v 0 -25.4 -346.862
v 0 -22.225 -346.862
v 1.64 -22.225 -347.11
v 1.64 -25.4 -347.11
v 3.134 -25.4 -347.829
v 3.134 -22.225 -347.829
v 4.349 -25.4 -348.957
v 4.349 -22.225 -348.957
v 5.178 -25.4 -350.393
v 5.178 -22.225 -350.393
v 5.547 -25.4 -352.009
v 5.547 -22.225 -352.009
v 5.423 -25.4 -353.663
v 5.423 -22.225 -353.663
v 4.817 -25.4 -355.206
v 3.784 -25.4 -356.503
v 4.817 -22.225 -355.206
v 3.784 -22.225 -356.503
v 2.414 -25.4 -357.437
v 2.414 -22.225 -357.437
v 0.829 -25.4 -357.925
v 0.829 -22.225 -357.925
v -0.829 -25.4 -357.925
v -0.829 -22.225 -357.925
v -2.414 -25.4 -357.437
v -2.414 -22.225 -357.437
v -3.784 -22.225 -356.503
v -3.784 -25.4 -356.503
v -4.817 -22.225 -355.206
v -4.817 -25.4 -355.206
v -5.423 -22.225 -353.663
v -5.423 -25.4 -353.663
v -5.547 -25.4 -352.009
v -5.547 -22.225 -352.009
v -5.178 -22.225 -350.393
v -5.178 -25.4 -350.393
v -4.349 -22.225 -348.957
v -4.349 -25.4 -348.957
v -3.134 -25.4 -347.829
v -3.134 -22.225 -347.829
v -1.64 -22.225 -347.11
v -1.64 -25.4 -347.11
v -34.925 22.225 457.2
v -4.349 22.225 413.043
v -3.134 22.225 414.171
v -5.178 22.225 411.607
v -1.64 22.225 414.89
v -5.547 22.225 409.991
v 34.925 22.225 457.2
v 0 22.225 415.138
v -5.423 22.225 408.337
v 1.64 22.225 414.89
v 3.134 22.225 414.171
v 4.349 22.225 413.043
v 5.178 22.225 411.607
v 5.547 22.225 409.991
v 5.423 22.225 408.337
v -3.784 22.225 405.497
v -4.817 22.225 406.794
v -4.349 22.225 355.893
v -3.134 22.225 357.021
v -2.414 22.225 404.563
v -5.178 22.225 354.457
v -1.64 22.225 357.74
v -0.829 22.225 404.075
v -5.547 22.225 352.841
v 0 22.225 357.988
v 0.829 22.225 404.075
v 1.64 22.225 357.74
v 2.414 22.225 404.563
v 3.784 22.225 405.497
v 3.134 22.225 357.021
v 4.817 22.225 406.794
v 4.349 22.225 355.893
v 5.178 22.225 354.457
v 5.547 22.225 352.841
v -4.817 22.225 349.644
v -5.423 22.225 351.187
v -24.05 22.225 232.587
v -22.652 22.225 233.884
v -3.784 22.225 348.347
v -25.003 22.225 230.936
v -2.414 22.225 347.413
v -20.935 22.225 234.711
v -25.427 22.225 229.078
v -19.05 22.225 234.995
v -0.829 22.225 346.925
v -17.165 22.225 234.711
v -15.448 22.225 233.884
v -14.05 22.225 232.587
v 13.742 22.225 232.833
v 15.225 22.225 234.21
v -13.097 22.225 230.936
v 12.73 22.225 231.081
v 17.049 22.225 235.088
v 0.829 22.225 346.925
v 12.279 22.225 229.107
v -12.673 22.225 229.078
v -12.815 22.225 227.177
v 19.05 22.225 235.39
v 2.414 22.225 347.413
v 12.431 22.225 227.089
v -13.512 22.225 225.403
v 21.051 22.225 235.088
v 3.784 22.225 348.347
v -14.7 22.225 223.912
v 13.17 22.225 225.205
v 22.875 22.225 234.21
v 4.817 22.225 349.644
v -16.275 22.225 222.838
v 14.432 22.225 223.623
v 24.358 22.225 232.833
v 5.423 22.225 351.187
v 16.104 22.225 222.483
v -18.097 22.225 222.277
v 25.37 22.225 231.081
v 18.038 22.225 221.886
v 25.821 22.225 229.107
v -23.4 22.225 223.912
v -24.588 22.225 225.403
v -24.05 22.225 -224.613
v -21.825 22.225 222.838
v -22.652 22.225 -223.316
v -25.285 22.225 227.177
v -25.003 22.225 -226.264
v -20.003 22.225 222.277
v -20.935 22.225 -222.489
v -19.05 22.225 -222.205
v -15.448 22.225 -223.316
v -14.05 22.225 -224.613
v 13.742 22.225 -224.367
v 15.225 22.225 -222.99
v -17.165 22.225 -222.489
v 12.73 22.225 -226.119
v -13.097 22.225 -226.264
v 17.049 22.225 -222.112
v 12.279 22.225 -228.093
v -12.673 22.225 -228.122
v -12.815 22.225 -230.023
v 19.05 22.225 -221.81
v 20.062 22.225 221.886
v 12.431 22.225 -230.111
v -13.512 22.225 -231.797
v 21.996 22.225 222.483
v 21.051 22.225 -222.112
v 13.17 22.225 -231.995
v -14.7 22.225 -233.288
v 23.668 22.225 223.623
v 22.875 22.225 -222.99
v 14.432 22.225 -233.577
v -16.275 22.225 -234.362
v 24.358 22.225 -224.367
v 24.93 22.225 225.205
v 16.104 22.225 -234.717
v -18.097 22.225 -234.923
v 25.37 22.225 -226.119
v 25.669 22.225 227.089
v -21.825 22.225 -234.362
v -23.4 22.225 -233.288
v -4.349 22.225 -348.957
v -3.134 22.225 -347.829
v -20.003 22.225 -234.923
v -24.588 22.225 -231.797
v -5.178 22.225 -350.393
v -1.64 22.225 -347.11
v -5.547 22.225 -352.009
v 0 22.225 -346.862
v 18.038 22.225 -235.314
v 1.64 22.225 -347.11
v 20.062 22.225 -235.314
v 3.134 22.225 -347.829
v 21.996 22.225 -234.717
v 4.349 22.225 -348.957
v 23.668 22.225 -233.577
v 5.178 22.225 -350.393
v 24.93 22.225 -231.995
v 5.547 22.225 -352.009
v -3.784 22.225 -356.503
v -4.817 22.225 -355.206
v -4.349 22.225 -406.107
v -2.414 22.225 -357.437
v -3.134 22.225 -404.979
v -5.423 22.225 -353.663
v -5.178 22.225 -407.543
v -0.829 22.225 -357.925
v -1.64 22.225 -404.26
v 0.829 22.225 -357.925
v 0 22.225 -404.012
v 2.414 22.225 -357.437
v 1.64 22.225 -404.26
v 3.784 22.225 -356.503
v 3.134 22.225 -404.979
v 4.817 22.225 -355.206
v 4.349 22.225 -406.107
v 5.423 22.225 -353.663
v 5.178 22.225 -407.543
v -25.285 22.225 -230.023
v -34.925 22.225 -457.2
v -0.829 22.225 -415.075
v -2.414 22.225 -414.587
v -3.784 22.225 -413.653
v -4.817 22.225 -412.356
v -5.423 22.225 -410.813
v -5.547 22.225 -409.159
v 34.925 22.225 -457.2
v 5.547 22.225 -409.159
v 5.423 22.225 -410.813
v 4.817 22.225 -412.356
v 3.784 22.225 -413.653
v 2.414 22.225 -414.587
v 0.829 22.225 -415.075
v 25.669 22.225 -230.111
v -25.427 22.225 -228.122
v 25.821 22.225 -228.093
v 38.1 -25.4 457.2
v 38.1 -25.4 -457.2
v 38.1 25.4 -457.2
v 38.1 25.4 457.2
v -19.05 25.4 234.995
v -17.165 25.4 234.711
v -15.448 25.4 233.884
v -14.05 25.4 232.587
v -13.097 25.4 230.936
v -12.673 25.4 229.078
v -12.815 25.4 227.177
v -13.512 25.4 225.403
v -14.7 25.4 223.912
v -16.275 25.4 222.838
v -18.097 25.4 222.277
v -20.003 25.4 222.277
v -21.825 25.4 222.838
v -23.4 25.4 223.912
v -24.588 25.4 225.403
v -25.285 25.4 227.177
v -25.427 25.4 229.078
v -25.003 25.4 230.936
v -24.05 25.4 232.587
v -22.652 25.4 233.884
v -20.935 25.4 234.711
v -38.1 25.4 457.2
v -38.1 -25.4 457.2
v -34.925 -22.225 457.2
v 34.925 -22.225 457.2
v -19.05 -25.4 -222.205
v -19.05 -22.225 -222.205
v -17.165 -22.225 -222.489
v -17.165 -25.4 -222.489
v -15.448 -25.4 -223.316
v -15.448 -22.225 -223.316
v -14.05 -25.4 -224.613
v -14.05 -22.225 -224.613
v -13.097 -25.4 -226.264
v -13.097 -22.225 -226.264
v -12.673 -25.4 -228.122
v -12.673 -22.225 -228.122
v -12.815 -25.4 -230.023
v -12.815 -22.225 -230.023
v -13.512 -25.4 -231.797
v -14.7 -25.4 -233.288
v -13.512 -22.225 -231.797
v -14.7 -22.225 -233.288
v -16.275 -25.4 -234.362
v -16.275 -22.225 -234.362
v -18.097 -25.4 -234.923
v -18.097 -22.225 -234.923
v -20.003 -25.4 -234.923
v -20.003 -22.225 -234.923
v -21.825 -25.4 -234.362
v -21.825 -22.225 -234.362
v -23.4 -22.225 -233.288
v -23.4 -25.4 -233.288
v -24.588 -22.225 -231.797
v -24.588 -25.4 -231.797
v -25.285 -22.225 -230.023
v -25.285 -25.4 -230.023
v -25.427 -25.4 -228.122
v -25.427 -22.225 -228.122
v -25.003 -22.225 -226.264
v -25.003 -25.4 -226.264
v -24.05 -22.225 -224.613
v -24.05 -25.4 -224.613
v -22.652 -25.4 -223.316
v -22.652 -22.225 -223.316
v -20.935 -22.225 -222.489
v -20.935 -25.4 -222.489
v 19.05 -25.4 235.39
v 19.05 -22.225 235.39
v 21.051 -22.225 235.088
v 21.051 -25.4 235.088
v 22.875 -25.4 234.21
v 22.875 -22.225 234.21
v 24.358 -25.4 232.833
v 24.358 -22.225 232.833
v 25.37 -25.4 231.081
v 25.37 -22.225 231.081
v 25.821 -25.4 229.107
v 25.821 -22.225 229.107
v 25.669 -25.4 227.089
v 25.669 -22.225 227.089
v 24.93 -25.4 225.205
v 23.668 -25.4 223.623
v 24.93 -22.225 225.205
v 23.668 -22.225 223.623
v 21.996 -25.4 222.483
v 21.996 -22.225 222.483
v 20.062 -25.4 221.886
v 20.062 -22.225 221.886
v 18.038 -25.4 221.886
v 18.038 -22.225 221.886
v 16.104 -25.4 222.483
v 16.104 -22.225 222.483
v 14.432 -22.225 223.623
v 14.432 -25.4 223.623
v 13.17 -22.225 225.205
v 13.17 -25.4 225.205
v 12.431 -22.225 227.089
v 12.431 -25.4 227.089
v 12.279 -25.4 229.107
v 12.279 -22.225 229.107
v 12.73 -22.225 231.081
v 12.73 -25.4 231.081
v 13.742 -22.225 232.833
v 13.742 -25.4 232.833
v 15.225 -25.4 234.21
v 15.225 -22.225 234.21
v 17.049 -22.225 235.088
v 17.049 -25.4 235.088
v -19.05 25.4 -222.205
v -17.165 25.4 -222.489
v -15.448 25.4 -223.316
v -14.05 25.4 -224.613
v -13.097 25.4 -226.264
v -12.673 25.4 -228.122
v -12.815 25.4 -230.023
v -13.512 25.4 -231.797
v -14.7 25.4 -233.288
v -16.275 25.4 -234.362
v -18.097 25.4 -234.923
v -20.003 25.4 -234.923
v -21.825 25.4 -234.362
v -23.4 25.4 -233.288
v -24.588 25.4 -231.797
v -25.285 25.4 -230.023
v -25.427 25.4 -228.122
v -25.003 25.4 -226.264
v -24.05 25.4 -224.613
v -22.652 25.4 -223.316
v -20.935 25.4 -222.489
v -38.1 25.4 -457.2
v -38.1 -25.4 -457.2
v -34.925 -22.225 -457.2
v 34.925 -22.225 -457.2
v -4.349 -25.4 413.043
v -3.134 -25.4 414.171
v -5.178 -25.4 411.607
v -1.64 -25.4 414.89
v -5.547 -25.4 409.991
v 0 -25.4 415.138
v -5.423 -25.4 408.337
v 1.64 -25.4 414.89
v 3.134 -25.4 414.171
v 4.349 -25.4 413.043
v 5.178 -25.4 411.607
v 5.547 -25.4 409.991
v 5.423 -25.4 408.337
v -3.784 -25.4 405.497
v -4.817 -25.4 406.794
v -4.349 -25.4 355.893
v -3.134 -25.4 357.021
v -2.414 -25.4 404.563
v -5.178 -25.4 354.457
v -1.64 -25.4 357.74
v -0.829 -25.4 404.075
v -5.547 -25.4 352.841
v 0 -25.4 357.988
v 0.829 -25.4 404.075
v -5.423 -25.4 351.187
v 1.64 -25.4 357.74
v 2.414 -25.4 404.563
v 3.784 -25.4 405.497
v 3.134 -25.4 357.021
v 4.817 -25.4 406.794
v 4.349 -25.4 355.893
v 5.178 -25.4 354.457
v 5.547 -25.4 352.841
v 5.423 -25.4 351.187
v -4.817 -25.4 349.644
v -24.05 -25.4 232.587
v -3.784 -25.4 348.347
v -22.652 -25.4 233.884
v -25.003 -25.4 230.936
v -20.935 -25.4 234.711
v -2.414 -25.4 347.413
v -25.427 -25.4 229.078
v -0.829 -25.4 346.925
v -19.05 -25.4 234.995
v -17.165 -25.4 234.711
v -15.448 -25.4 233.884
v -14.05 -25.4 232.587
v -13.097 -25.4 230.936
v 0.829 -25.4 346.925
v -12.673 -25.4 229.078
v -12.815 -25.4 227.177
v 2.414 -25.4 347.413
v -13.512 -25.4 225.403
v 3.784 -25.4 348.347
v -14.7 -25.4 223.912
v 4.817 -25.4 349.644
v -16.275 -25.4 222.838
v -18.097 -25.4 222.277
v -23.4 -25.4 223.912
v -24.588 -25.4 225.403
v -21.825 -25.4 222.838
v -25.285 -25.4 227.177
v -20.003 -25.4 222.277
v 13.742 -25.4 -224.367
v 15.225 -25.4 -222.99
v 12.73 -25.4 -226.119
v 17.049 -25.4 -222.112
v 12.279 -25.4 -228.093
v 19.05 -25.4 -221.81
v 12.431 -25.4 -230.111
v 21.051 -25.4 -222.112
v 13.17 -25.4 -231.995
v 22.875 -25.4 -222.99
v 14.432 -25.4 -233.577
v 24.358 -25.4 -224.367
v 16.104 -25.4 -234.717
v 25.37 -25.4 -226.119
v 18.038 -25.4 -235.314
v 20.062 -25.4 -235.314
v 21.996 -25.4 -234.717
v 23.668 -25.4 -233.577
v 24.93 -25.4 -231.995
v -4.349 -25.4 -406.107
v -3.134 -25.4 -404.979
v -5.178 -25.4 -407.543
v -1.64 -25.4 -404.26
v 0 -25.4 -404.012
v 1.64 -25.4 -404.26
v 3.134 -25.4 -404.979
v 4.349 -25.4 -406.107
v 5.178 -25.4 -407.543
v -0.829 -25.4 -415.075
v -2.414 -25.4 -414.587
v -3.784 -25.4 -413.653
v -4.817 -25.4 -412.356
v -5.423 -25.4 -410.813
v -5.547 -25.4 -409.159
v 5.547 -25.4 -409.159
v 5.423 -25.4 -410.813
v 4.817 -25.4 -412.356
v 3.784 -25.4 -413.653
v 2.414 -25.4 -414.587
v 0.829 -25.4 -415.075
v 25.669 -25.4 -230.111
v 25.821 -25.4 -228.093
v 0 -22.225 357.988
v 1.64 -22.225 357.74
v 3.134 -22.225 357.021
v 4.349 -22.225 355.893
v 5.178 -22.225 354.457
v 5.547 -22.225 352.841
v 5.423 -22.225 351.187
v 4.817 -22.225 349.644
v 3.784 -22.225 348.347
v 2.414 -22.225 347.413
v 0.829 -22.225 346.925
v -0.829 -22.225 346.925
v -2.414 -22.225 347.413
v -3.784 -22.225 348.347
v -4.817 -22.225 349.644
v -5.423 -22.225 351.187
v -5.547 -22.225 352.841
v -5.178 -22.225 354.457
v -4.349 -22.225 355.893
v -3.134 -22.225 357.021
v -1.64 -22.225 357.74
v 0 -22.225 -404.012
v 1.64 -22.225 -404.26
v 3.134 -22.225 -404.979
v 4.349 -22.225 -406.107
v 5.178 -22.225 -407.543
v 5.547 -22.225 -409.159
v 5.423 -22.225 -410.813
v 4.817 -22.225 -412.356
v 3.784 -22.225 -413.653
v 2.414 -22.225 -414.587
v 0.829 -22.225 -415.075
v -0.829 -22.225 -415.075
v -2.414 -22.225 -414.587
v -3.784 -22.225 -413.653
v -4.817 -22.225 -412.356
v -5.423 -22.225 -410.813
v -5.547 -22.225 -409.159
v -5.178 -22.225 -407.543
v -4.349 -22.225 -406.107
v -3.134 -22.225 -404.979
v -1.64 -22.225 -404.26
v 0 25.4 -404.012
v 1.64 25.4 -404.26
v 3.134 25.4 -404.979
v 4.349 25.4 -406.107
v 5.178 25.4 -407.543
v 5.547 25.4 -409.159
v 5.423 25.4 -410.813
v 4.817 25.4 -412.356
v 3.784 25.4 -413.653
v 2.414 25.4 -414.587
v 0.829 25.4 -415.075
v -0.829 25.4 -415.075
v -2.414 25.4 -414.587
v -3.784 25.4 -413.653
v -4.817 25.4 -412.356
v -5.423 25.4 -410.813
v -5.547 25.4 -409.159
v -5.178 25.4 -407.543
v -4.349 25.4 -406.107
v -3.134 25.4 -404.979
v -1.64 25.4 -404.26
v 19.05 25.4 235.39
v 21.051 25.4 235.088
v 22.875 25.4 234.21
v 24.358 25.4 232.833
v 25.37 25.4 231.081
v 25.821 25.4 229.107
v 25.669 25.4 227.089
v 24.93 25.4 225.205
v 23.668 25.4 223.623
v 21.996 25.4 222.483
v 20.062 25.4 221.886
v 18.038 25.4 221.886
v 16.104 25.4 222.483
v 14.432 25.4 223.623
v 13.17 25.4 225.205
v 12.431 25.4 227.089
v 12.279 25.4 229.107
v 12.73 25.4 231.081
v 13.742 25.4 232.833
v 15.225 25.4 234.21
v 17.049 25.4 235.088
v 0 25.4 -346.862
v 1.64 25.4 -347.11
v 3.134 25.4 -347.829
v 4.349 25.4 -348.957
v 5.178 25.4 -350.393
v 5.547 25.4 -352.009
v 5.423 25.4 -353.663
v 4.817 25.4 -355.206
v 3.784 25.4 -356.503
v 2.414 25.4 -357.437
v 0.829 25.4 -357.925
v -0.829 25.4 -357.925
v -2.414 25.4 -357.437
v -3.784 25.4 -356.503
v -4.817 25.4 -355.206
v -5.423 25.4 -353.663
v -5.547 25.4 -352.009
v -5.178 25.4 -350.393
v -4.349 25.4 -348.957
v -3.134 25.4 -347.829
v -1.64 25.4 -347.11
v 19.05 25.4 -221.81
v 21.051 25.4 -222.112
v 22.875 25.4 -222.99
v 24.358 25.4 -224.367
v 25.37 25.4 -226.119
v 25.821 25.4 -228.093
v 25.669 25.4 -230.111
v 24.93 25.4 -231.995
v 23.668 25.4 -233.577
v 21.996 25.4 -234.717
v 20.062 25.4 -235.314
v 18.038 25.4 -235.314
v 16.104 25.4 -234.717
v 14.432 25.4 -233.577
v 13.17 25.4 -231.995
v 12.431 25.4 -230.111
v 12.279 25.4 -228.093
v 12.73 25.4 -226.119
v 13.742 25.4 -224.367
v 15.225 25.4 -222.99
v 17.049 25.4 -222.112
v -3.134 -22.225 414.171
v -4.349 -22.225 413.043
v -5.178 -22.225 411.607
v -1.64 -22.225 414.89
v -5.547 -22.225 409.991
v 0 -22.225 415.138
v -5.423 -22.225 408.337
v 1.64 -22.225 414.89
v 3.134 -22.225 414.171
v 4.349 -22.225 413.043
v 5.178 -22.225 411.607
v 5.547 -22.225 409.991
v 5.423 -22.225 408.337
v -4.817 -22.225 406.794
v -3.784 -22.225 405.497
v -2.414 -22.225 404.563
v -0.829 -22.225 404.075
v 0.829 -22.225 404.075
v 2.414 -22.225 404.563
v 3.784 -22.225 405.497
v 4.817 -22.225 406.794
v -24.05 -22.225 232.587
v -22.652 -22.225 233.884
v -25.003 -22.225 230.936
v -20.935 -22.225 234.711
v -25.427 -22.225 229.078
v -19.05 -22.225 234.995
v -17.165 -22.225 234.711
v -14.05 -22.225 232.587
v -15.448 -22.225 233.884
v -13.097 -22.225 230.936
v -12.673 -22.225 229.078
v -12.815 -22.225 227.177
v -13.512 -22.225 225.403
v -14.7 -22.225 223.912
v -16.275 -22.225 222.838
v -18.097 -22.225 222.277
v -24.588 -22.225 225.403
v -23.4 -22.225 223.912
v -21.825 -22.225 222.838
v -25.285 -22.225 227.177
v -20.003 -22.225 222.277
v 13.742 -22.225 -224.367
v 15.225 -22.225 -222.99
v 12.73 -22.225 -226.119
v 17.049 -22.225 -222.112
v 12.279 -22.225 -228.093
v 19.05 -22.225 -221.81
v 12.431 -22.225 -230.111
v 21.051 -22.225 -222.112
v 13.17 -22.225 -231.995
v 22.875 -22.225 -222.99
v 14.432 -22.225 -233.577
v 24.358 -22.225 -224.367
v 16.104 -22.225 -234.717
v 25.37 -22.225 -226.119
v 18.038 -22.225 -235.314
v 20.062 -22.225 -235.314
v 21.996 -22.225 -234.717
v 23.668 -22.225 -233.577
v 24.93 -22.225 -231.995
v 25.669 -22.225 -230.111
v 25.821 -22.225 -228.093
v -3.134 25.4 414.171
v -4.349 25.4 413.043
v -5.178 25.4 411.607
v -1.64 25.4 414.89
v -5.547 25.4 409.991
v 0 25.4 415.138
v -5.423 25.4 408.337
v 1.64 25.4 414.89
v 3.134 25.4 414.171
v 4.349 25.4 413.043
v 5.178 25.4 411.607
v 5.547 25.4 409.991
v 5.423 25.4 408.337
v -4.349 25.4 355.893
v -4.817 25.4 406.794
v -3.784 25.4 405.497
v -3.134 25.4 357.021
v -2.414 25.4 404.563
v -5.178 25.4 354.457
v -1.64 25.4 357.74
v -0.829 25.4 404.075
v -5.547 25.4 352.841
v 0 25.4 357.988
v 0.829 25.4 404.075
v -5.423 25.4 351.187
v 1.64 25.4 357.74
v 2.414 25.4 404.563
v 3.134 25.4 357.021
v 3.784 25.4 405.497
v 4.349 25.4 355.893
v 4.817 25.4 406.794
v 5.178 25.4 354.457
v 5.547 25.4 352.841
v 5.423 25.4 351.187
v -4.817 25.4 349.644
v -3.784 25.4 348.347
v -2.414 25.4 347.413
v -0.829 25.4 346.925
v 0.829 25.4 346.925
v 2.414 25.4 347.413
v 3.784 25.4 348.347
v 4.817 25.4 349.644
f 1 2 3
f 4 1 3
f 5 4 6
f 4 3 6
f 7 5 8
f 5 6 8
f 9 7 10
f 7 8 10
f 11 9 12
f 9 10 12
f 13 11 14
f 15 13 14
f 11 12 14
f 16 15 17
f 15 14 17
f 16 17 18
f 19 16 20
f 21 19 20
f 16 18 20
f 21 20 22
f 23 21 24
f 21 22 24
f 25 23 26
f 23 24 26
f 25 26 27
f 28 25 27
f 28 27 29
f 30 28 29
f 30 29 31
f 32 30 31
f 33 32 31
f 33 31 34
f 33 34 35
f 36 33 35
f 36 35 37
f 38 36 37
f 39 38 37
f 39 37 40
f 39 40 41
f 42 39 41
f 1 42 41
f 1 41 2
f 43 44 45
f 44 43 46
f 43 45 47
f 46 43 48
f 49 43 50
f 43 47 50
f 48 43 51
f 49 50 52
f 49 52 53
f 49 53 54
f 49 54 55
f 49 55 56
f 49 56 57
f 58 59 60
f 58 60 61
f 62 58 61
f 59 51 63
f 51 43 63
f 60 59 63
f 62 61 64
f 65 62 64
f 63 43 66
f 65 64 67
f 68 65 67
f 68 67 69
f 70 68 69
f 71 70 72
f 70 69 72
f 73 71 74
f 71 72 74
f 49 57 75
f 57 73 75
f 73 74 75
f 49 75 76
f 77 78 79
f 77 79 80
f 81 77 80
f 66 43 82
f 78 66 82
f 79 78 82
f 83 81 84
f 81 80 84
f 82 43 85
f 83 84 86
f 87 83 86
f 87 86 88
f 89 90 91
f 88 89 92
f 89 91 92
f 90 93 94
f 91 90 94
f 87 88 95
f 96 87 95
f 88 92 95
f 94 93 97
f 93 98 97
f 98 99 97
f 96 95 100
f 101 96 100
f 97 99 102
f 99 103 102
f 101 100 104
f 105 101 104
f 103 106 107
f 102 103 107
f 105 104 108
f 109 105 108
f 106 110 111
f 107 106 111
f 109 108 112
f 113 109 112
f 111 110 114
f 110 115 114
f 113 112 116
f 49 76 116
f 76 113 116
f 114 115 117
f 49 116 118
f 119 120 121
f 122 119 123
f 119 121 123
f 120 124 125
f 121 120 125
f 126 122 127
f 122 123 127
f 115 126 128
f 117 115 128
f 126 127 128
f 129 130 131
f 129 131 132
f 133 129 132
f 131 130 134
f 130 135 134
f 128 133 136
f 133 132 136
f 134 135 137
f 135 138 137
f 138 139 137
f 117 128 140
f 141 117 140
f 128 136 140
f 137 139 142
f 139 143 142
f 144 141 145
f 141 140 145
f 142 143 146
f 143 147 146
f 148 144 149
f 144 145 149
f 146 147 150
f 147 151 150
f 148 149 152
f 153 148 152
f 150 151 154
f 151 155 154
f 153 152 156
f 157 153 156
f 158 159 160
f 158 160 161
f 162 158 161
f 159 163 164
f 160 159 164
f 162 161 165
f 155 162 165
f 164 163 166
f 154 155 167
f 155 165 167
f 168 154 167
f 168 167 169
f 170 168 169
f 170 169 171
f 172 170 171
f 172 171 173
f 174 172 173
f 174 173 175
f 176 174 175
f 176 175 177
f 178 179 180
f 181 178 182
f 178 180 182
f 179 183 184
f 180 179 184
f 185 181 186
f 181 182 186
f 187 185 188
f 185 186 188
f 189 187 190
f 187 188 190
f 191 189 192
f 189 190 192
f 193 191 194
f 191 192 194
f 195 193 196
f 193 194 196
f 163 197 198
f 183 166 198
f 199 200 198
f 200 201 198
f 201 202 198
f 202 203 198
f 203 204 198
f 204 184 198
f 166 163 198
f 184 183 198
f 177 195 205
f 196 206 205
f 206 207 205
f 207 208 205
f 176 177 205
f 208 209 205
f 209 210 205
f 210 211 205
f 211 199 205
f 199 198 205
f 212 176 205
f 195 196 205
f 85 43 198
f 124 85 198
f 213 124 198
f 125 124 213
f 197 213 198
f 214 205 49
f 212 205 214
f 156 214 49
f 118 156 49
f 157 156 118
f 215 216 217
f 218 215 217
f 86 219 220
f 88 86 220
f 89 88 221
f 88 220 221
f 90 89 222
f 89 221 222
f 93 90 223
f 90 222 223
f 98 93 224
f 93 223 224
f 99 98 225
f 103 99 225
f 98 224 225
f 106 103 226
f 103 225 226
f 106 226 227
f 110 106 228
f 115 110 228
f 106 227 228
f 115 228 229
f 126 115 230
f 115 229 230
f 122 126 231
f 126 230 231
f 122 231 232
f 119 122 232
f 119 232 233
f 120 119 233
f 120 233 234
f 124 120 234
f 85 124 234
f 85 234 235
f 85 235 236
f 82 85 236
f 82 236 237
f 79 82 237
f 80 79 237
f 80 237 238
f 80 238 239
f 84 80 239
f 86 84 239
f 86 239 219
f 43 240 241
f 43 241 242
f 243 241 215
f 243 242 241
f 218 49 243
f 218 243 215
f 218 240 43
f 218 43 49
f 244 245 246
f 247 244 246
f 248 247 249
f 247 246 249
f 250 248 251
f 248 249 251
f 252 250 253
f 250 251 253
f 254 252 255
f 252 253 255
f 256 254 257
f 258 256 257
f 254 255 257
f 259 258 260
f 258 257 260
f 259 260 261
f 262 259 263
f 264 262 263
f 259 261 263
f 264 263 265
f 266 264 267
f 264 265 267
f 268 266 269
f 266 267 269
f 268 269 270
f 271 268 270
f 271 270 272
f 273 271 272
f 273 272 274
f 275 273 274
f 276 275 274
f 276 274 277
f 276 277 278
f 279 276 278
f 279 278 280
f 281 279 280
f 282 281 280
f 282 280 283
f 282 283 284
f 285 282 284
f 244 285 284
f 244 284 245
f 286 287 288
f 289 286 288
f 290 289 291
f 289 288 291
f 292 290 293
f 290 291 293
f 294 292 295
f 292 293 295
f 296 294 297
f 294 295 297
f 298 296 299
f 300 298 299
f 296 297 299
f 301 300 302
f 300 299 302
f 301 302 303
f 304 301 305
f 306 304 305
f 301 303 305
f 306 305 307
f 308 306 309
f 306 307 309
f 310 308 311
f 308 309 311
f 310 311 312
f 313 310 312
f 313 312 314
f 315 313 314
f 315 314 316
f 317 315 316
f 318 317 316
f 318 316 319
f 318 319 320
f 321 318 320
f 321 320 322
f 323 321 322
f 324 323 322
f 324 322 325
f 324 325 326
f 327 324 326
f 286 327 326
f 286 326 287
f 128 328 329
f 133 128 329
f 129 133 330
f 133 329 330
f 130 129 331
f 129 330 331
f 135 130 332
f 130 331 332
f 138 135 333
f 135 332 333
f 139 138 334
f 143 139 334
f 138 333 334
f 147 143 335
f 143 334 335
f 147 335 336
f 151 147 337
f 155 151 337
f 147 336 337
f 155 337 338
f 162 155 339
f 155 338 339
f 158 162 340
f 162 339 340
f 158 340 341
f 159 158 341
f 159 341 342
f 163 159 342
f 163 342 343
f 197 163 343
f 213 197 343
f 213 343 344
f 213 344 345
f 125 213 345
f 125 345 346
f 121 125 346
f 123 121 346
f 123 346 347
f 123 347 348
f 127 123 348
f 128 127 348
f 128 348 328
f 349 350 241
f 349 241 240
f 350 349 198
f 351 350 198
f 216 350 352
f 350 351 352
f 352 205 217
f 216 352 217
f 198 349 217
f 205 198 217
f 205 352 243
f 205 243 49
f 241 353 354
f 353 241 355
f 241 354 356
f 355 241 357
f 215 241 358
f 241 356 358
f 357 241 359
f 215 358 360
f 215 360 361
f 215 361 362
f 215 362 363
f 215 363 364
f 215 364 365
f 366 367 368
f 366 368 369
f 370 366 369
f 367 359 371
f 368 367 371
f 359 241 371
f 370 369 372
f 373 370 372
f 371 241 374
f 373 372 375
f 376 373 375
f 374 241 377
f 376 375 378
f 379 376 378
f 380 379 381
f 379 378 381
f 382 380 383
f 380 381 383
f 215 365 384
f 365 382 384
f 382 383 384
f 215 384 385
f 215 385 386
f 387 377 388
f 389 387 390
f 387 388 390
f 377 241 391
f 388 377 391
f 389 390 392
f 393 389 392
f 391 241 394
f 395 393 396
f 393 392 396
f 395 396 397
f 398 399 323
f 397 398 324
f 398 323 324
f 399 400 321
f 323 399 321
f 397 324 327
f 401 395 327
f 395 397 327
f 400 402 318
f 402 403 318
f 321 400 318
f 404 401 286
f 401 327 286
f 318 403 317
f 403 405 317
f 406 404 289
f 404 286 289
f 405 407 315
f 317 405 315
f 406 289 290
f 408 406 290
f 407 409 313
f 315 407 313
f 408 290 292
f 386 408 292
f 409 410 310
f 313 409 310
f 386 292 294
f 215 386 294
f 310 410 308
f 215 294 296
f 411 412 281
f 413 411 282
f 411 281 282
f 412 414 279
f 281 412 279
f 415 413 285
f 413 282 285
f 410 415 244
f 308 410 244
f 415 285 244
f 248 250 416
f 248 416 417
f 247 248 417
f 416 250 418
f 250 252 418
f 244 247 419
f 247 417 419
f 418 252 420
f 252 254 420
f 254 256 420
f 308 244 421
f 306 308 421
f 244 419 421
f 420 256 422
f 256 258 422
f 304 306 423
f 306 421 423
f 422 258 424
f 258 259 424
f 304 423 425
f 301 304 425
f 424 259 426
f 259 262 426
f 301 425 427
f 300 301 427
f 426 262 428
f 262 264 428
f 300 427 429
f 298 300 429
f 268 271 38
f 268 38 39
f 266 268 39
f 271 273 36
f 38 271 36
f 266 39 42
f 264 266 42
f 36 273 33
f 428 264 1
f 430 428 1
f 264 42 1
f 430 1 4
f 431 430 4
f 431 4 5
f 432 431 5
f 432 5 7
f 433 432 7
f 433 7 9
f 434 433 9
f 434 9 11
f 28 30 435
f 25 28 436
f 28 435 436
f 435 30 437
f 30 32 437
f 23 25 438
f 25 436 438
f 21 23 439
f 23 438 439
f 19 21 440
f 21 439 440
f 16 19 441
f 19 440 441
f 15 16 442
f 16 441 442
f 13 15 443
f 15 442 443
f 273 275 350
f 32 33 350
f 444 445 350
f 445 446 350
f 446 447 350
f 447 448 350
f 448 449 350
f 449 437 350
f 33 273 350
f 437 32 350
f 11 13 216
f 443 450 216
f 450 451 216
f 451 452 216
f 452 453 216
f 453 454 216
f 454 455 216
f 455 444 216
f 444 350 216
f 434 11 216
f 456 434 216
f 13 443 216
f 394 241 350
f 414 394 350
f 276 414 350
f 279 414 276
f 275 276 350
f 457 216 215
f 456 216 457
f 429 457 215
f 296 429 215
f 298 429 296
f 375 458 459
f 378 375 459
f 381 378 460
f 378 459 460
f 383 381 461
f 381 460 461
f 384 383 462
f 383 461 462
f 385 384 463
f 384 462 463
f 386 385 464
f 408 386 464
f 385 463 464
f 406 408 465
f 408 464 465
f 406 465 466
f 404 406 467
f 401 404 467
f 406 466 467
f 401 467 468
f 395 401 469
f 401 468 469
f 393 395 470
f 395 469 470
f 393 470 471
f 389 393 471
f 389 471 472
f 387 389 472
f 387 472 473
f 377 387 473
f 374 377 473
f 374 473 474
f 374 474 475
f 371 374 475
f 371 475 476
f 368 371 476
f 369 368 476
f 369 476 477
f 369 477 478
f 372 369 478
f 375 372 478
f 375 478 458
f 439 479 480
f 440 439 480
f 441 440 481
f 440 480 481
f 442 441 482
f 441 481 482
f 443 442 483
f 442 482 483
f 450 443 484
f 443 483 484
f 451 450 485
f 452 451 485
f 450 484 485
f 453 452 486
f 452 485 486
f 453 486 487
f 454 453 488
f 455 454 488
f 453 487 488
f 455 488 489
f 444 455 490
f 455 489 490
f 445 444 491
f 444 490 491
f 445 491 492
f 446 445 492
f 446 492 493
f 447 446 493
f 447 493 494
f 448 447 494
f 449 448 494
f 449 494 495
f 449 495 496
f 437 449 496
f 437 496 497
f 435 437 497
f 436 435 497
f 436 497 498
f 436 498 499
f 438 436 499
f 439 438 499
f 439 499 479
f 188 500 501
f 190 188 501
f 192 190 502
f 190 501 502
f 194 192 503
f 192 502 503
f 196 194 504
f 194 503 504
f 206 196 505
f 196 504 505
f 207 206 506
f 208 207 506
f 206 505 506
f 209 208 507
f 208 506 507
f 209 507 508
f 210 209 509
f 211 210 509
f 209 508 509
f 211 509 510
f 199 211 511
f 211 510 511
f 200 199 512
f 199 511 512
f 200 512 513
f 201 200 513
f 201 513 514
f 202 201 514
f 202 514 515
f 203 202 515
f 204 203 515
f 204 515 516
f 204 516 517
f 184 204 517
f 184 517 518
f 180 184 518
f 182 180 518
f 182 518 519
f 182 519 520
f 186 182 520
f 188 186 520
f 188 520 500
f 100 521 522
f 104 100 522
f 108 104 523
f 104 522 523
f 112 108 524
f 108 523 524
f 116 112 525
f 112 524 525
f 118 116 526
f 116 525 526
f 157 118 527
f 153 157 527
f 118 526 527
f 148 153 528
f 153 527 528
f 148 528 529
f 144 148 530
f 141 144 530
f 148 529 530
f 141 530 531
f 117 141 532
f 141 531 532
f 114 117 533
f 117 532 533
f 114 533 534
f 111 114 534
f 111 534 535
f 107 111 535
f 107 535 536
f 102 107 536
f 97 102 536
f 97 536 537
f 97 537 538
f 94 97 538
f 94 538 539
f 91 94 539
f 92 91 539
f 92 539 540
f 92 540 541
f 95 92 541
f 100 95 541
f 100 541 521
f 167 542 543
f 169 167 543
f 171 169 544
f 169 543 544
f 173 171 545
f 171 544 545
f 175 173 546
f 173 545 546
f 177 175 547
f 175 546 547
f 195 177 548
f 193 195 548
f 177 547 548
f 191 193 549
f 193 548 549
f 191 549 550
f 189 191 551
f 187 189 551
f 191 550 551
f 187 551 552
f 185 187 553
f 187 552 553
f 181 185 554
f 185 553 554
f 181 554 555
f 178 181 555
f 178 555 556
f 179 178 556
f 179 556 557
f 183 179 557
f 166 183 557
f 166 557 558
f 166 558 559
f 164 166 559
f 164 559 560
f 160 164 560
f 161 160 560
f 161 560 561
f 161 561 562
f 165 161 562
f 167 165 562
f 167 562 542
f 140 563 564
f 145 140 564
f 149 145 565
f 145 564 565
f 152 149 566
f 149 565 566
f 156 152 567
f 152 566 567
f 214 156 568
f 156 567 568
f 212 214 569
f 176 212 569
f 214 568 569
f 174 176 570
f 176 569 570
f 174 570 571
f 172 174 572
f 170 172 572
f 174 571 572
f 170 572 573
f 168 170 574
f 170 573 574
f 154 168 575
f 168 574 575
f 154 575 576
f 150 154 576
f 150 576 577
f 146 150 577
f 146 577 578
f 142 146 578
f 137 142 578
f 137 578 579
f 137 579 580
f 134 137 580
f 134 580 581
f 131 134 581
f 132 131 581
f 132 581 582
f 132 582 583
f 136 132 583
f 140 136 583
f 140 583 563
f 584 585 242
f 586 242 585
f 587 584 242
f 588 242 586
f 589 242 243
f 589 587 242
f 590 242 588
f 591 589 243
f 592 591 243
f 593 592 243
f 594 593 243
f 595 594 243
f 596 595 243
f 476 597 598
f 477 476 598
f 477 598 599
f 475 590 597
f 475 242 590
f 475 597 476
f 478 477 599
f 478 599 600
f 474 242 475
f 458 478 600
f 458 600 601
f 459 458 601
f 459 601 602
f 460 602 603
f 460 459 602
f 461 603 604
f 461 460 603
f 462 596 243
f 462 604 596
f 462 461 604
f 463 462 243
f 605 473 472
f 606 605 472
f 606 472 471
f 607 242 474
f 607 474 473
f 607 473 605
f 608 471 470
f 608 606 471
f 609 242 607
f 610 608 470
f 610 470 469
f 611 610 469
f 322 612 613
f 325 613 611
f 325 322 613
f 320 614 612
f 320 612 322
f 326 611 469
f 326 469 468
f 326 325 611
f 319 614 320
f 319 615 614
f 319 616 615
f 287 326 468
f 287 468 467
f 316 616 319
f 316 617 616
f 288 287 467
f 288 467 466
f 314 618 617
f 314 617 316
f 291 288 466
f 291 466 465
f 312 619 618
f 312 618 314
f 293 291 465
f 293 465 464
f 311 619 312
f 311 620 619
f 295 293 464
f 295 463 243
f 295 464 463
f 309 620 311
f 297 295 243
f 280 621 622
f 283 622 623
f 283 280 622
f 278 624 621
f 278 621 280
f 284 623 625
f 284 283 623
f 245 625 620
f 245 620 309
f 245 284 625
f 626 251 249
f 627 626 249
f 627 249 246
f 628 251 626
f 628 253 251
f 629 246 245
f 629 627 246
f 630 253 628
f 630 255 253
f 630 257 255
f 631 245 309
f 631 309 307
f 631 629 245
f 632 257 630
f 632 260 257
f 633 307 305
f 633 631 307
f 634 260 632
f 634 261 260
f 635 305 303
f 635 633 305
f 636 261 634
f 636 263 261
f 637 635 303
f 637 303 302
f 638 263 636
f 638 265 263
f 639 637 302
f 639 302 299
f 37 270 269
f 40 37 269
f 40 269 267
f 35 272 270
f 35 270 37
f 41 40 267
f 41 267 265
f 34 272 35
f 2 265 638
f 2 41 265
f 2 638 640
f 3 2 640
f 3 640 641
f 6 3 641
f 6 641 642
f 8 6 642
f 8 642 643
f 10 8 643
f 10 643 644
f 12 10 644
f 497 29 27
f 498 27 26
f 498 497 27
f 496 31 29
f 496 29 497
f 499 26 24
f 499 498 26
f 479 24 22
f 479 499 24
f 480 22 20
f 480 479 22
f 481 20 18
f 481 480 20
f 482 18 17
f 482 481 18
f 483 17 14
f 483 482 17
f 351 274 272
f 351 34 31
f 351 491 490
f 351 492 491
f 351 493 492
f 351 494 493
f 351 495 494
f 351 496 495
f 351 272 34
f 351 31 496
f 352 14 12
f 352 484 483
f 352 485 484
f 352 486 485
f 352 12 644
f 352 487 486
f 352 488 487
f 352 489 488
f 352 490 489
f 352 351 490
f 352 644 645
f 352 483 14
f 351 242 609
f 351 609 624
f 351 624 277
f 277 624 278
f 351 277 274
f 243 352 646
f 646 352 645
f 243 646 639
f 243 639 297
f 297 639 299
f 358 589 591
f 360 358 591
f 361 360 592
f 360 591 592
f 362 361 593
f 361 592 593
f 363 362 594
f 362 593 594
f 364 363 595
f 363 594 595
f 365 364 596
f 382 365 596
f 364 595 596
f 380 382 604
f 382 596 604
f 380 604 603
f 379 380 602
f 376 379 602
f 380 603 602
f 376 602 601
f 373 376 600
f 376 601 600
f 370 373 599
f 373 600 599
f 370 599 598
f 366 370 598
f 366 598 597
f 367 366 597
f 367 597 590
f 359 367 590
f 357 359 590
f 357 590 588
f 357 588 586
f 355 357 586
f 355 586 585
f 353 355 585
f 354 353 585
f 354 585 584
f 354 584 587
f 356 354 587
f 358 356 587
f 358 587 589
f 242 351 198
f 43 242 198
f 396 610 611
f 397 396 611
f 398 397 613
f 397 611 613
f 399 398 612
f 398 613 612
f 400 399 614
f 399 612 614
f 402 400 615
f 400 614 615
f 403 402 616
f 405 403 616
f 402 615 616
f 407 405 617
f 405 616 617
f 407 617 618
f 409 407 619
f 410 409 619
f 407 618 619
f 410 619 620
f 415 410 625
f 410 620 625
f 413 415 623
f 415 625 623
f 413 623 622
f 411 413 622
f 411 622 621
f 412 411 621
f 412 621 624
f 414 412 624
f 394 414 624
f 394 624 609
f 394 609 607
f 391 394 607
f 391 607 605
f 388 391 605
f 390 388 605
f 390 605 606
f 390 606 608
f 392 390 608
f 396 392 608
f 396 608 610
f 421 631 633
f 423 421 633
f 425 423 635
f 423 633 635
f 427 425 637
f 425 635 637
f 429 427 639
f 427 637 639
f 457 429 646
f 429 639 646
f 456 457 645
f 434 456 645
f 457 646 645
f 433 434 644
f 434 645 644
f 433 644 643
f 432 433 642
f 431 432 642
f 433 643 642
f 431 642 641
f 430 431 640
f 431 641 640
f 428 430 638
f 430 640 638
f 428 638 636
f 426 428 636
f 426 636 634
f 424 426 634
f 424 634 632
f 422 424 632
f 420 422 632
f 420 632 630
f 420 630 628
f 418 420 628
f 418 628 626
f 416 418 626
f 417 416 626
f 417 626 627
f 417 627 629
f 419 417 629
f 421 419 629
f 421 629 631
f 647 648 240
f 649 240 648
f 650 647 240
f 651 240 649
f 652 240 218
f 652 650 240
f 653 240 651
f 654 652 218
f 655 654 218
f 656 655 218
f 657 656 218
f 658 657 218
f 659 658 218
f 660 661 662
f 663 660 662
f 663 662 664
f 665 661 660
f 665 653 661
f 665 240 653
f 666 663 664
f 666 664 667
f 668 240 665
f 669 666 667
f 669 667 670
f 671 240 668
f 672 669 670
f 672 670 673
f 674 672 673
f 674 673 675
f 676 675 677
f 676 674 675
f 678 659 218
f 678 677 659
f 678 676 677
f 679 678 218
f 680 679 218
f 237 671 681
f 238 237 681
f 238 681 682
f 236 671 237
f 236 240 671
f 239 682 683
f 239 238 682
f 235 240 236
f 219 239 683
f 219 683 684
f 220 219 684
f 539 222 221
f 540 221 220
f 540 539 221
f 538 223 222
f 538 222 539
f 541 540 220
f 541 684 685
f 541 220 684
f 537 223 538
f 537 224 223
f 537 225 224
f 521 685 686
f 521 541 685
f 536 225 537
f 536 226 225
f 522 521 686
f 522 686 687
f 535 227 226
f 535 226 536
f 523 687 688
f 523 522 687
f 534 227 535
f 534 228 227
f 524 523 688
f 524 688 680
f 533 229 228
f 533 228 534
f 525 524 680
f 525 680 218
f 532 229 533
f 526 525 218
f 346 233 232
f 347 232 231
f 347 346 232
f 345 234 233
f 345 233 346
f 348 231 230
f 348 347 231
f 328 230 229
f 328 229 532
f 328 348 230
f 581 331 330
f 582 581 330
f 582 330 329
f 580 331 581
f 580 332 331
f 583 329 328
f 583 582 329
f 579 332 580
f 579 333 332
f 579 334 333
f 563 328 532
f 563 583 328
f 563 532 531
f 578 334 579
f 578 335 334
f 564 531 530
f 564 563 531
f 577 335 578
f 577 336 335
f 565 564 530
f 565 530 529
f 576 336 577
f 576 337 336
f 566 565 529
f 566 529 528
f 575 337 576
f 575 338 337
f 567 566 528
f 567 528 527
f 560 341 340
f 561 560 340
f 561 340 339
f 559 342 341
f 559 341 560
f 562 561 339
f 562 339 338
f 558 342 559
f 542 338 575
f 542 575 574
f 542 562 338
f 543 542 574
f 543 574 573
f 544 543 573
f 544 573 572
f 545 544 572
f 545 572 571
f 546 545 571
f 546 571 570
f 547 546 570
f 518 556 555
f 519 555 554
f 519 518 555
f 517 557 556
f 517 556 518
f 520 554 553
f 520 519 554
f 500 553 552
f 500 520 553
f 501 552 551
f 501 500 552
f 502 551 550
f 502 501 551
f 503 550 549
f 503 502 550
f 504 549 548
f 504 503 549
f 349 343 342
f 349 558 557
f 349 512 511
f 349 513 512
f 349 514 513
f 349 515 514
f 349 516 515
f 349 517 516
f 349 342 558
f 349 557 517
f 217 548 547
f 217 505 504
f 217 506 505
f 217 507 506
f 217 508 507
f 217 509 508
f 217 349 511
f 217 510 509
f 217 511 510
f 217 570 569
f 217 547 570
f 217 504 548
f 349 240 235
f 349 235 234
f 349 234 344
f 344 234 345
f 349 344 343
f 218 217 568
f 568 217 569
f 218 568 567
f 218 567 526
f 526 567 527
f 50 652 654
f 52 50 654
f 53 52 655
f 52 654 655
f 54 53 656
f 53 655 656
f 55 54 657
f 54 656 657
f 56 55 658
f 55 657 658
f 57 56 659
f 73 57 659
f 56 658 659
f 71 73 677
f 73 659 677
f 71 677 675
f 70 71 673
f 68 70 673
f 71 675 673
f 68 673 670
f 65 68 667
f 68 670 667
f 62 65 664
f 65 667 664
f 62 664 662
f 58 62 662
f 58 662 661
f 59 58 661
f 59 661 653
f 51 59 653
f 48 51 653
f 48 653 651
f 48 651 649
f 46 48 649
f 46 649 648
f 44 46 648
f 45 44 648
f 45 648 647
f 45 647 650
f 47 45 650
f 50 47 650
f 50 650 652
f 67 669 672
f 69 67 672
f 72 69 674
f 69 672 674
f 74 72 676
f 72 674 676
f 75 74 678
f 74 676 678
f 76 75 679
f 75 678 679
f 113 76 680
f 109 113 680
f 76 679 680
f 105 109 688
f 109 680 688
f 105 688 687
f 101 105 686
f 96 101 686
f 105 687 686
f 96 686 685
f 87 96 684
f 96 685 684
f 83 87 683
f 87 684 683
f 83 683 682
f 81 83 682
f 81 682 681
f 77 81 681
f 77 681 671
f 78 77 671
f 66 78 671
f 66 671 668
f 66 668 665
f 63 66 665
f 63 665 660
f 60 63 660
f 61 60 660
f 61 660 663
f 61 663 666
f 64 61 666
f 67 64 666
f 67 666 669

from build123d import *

# Parameters (mm, degrees)
BOSS_EXTRUDE1_DEPTH      = 457.2
BOSS_EXTRUDE1_DEPTH_BACK = 457.2
SKETCH3_W                = 76.2
SKETCH3_H                = 50.8
SKETCH3_W_2              = 69.85
SKETCH3_H_2              = 44.45
SKETCH6_R                = 6.394880264
SKETCH6_R_2              = 6.789577508
SKETCH6_R_3              = 5.5626
CUT_EXTRUDE1_DEPTH       = 462.588658873


with BuildPart() as part:
    # Sketch3 → Boss-Extrude1 (new, two sides: drawn at the far end of the back side and taken through both)
    with BuildSketch(Plane.XY.offset(-BOSS_EXTRUDE1_DEPTH_BACK)):
        Rectangle(SKETCH3_W, SKETCH3_H)
        Rectangle(SKETCH3_W_2, SKETCH3_H_2, mode=Mode.SUBTRACT)
    extrude(amount=BOSS_EXTRUDE1_DEPTH + BOSS_EXTRUDE1_DEPTH_BACK)

    # Sketch6 → Cut-Extrude1 (cut, through all)
    with BuildSketch(Plane(origin=(0, 25.4, 0), x_dir=(1, 0, 0), z_dir=(0, 1, 0))):
        with Locations(Location((-19.05, -228.6, 0), (0, 0, 270))):
            Circle(SKETCH6_R)
        with Locations(Location((19.05, -228.6, 0), (0, 0, 270))):
            Circle(SKETCH6_R_2)
        with Locations(Location((19.05, 228.6, 0), (0, 0, 270))):
            Circle(SKETCH6_R_2)
        with Locations(Location((-19.05, 228.6, 0), (0, 0, 270))):
            Circle(SKETCH6_R)
        with Locations(Location((0, -352.425, 0), (0, 0, 270))):
            Circle(SKETCH6_R_3)
        with Locations(Location((0, -409.575, 0), (0, 0, 270))):
            Circle(SKETCH6_R_3)
        with Locations(Location((0, 409.575, 0), (0, 0, 270))):
            Circle(SKETCH6_R_3)
        with Locations(Location((0, 352.425, 0), (0, 0, 270))):
            Circle(SKETCH6_R_3)
    extrude(amount=-CUT_EXTRUDE1_DEPTH, mode=Mode.SUBTRACT)


solid = part.part
